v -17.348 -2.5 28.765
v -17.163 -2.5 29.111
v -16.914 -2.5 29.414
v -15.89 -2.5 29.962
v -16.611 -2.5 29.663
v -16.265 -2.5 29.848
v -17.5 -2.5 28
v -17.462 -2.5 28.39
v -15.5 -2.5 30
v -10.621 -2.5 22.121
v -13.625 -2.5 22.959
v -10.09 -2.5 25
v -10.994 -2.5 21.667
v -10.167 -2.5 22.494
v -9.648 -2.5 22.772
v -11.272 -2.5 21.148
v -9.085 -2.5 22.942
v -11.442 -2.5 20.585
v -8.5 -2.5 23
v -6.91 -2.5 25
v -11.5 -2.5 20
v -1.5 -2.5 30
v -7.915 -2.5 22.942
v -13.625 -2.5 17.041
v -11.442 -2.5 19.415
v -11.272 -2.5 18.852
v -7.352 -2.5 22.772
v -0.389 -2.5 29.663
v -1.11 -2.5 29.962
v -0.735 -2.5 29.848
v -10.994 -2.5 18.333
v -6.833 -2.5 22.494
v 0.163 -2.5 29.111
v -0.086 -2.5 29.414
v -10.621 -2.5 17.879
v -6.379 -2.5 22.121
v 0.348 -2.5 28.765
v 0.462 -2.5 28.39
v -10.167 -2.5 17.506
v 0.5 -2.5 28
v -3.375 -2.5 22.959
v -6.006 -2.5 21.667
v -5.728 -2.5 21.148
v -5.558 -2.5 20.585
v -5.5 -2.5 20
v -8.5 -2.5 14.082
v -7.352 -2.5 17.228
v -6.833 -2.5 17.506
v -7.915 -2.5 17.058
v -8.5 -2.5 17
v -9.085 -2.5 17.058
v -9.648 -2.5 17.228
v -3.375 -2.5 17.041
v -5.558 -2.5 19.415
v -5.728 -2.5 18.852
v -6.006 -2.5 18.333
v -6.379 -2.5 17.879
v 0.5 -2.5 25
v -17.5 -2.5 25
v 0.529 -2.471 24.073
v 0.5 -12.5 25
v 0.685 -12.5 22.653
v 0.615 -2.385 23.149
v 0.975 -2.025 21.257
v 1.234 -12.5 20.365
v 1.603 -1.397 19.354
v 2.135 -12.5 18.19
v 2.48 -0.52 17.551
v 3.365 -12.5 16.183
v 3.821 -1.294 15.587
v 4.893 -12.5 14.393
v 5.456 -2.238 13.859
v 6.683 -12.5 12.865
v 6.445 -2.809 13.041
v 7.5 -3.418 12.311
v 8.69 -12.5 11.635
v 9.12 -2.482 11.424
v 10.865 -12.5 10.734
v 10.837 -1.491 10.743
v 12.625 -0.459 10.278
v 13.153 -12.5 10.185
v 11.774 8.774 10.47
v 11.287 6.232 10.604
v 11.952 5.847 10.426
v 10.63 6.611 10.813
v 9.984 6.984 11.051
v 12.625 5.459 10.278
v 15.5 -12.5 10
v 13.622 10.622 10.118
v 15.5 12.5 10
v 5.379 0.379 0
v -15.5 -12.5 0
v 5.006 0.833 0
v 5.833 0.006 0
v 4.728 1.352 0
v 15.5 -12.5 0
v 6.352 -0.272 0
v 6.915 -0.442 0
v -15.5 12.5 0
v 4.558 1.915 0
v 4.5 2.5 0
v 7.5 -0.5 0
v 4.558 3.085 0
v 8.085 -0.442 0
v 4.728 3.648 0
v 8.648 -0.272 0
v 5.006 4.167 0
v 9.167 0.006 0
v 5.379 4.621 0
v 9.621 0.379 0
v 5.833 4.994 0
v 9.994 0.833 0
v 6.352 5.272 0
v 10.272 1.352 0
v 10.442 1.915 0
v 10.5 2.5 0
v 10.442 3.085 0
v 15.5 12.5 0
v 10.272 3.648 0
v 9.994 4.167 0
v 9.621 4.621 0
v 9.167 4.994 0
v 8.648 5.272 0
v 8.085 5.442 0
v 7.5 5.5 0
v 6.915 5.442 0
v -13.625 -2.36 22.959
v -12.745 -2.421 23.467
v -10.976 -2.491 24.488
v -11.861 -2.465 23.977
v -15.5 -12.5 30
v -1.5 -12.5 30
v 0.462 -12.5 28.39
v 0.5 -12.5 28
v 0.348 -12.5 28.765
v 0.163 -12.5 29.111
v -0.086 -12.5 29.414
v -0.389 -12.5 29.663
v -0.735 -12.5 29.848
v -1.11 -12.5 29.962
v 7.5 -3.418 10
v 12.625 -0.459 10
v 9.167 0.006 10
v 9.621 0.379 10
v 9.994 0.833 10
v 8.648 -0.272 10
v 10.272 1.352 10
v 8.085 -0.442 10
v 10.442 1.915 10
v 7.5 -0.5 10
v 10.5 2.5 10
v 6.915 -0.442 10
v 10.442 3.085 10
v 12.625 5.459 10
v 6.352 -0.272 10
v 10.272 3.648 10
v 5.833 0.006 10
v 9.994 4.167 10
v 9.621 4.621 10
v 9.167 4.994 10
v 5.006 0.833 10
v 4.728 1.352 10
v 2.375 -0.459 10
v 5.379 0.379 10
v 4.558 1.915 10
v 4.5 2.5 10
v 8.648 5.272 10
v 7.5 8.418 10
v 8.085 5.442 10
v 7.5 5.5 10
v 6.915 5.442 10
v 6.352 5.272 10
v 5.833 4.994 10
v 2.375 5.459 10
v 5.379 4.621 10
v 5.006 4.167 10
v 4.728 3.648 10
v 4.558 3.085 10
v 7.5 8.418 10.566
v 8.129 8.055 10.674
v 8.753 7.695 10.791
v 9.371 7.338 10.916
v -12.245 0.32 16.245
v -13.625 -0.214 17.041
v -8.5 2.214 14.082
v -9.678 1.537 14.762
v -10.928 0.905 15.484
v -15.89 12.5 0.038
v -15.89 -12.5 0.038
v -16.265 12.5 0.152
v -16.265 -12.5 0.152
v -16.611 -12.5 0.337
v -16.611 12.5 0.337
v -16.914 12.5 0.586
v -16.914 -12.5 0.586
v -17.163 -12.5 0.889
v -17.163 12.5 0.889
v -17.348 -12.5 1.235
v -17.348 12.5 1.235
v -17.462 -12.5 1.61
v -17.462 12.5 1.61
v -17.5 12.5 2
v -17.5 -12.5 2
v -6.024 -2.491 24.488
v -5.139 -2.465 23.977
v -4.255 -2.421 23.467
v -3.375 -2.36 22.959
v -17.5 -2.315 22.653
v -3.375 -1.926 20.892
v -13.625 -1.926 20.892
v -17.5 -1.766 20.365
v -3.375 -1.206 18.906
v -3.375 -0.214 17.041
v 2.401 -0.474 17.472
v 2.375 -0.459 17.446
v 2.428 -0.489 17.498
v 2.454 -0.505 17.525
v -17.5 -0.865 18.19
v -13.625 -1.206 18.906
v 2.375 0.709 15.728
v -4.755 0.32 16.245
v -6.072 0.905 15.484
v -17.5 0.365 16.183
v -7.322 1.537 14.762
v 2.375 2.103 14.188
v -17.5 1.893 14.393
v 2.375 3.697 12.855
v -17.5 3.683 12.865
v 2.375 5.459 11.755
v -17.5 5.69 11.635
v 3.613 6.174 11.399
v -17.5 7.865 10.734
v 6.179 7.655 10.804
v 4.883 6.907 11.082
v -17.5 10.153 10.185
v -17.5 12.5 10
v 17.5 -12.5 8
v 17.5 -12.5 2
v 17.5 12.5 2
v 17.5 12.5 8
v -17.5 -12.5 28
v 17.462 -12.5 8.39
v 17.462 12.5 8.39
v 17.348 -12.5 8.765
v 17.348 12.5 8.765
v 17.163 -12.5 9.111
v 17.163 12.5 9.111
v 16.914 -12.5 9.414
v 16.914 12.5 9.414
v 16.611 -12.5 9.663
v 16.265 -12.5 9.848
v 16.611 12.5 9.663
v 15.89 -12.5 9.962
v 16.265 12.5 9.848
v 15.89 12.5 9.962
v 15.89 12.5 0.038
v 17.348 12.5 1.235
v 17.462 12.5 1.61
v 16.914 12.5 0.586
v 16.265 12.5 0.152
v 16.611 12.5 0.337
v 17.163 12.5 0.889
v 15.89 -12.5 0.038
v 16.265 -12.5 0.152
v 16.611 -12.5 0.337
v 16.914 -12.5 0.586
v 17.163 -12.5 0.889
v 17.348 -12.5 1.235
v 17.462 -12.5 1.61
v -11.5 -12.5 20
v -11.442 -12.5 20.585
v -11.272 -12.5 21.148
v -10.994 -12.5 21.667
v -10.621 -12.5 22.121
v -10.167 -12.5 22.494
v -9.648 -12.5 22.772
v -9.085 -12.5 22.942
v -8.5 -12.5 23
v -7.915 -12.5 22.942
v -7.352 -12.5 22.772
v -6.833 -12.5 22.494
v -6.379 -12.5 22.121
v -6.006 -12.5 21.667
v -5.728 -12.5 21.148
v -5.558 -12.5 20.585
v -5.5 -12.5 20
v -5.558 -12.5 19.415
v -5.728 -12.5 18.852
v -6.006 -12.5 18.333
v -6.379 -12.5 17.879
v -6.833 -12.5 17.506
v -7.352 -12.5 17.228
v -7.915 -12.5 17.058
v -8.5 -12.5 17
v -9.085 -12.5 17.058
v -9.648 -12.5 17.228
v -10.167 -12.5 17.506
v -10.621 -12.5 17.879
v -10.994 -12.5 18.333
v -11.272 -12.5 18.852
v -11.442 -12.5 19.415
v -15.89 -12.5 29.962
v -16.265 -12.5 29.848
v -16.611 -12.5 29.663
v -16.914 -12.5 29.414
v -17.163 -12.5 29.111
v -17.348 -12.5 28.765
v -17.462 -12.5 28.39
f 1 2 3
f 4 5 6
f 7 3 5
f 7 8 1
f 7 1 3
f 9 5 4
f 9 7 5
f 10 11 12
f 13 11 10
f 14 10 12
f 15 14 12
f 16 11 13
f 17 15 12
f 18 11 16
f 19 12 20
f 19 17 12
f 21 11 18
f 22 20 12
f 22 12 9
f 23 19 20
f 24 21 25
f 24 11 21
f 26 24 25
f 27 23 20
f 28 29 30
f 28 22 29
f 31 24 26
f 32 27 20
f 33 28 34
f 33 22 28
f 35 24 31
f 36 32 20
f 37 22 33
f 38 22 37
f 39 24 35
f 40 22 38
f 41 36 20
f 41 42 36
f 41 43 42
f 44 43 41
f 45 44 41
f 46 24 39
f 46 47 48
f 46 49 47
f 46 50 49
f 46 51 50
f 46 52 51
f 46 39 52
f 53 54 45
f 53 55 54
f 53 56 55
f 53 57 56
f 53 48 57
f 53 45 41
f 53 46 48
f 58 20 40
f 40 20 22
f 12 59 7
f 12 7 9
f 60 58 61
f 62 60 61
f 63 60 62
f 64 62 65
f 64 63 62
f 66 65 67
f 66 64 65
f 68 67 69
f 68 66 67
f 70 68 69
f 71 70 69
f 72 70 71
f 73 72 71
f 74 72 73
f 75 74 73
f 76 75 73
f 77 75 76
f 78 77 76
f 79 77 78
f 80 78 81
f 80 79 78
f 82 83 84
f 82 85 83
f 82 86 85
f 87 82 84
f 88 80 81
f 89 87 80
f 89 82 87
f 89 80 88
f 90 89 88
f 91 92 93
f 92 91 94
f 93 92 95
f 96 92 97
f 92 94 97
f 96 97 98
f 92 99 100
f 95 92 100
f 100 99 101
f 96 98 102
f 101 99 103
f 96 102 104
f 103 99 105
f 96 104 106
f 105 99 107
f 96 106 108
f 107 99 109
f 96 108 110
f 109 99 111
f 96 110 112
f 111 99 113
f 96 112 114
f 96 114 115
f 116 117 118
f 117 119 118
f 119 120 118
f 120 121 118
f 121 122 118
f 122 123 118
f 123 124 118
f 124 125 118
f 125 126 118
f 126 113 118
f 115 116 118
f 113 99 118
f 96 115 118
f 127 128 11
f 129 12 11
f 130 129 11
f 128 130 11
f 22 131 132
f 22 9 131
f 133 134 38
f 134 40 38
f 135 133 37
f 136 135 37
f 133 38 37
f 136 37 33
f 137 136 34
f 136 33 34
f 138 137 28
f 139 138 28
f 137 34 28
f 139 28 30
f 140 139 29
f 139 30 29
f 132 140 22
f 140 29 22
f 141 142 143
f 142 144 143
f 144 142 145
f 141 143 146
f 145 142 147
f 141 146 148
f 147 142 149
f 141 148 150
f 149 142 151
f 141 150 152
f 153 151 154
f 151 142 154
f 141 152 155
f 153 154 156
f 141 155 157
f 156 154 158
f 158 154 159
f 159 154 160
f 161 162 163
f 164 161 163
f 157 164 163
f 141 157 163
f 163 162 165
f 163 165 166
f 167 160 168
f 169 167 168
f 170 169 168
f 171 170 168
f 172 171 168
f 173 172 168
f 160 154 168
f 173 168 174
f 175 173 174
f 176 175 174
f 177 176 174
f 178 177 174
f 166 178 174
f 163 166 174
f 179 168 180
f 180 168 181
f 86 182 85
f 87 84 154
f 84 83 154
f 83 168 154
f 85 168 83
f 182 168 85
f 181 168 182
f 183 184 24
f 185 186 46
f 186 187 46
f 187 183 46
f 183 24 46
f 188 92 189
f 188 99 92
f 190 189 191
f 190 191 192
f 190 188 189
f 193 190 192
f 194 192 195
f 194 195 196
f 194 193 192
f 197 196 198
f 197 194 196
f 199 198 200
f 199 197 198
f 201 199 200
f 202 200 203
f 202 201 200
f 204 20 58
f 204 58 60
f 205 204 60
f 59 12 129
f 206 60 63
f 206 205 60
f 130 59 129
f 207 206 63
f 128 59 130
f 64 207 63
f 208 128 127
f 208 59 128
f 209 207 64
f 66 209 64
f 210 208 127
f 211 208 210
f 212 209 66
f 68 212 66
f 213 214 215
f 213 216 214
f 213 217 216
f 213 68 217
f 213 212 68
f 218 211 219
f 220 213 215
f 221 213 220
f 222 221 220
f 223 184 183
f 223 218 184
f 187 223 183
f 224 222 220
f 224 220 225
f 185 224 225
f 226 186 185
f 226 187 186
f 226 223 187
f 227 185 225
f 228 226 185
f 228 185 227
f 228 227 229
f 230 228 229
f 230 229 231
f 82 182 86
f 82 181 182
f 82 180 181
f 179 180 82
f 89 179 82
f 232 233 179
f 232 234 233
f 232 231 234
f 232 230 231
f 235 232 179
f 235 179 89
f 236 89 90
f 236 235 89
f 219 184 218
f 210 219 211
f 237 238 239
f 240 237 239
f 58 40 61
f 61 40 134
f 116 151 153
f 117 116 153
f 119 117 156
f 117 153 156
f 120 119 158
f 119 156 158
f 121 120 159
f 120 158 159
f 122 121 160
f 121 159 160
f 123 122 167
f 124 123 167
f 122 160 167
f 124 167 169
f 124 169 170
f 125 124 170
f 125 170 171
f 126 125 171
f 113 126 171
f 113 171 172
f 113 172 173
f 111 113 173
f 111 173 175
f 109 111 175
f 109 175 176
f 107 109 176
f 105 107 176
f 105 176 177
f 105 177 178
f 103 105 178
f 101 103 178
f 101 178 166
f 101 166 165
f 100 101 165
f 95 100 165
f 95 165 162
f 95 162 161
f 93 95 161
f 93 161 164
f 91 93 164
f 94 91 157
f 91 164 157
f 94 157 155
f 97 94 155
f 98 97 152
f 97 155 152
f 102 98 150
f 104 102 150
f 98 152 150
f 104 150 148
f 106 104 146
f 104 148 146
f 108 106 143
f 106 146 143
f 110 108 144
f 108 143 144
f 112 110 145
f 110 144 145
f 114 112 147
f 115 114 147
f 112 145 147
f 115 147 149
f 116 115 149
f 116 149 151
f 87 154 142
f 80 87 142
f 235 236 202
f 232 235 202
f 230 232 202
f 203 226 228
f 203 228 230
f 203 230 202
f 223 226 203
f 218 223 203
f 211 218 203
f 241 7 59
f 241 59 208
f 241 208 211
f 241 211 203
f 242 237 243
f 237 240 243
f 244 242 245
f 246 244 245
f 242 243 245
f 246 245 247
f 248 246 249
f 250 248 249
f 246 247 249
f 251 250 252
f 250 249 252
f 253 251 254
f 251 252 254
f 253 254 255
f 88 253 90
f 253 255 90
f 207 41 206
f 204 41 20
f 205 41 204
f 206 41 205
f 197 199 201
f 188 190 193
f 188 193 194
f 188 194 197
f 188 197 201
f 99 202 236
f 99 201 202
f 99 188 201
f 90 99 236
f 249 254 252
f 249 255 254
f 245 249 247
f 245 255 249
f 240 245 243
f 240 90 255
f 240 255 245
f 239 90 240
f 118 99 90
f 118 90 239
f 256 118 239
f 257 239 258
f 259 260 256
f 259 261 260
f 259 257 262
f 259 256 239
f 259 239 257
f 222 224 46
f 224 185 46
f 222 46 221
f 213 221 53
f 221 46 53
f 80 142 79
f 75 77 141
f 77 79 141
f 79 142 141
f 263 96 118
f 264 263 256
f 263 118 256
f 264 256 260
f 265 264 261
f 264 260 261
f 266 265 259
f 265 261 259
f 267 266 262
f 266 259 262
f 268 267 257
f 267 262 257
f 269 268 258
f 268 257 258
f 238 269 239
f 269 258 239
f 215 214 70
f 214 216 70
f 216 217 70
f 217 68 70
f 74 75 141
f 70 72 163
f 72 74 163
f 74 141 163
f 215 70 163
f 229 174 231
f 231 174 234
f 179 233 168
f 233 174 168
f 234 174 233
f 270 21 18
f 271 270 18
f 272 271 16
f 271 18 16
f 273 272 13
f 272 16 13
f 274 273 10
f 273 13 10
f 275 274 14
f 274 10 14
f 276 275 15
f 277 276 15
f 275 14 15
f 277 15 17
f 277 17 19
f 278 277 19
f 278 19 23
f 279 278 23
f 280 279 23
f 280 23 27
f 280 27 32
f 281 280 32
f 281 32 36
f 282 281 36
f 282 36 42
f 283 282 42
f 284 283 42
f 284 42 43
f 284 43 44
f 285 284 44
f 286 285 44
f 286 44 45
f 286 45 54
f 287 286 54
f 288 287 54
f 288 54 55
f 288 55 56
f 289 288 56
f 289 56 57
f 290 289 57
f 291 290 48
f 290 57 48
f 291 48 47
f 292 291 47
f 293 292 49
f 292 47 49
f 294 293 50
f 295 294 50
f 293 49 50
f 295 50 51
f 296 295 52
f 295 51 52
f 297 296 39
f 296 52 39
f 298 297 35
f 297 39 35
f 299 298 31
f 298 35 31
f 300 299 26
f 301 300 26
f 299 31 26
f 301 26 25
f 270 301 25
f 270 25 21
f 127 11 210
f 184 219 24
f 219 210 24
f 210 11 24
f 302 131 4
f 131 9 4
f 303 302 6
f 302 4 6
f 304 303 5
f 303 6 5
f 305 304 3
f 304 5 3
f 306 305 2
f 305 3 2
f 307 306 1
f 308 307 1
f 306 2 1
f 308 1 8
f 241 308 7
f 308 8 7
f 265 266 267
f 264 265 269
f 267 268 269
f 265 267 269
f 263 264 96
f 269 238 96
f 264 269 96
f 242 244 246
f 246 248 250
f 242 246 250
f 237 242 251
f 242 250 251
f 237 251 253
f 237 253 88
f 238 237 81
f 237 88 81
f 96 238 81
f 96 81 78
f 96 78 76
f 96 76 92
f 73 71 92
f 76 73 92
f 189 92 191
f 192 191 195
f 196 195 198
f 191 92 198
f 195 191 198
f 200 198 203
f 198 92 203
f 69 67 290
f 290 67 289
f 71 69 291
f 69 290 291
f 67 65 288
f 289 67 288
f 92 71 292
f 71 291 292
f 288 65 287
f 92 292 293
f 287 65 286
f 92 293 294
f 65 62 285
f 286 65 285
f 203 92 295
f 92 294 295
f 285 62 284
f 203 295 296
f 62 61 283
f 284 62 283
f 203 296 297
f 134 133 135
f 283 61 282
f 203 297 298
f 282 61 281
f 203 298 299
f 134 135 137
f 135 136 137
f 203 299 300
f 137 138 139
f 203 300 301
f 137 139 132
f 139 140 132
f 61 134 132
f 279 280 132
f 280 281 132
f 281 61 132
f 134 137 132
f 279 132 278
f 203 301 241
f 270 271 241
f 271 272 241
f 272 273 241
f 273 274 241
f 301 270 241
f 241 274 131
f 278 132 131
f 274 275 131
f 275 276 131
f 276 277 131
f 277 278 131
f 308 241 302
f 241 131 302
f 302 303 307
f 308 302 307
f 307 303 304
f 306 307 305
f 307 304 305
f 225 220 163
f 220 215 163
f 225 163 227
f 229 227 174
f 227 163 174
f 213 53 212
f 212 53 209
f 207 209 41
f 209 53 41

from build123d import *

# Parameters (mm, degrees)
SKETCH1_W           = 35
SKETCH1_H           = 25
BOSS_EXTRUDE1_DEPTH = 10
SKETCH2_R           = 3
CUT_EXTRUDE1_DEPTH  = 24.717082451
SKETCH3_W           = 18
SKETCH3_H           = 10
BOSS_EXTRUDE2_DEPTH = 20
SKETCH4_R           = 3
CUT_EXTRUDE2_DEPTH  = 38.831864876
FILLET2_R           = 15
FILLET3_R           = 2
CUT_EXTRUDE3_START  = -10
CUT_EXTRUDE3_DEPTH  = 27.912057753
CUT_EXTRUDE4_START  = -10
CUT_EXTRUDE4_DEPTH  = 33.793107057


# Some blends are built 0.0001 mm under size
with BuildPart() as part:
    # Sketch1 → Boss-Extrude1 (new body)
    with BuildSketch(Plane.XY):
        Rectangle(SKETCH1_W, SKETCH1_H)
    extrude(amount=BOSS_EXTRUDE1_DEPTH)

    # Sketch2 → Cut-Extrude1 (cut, through all)
    with BuildSketch(Plane.XY.offset(10)):
        with Locations((7.5, 2.5)):
            Circle(SKETCH2_R)
    extrude(amount=-CUT_EXTRUDE1_DEPTH, mode=Mode.SUBTRACT)

    # Sketch3 → Boss-Extrude2 (add)
    with BuildSketch(Plane.XY.offset(10)):
        with Locations((-8.5, -7.5)):
            Rectangle(SKETCH3_W, SKETCH3_H)
    extrude(amount=BOSS_EXTRUDE2_DEPTH)

    # Sketch4 → Cut-Extrude2 (cut, through all)
    with BuildSketch(Plane(origin=(0, -2.5, 0), x_dir=(1, 0, 0), z_dir=(0, 1, 0))):
        with Locations(Location((-8.5, -20, 0), (0, 0, 180))):
            Circle(SKETCH4_R)
    extrude(amount=-CUT_EXTRUDE2_DEPTH, mode=Mode.SUBTRACT)

    # Fillet2
    # the kernel refuses this fillet: 15 mm, written as the material it adds along each edge
    with BuildSketch(Plane(origin=(-17.5, -2.5, 10), x_dir=(0, 1, 0), z_dir=(1, 0, 0))) as fillet2_piece_1_section:
        with BuildLine():
            CenterArc((FILLET2_R, FILLET2_R), FILLET2_R, 180, 90)
            Line((0, FILLET2_R), (0, 0))
            Line((0, 0), (FILLET2_R, 0))
        make_face()
    fillet2_piece_1 = extrude(amount=18, mode=Mode.PRIVATE)
    fillet2_piece_1 = fillet2_piece_1 - Plane(origin=(-8.5, 1.000391612, 20), x_dir=(-1, 0, 0), z_dir=(0, 1, 0)) * Cylinder(3, 96, mode=Mode.PRIVATE)
    add(fillet2_piece_1)
    with BuildSketch(Plane(origin=(0.5, -2.5, 10), x_dir=(1, 0, 0), z_dir=(0, -1, 0))) as fillet2_piece_2:
        with BuildLine():
            CenterArc((FILLET2_R, FILLET2_R), FILLET2_R, 180, 90)
            Line((0, FILLET2_R), (0, 0))
            Line((0, 0), (FILLET2_R, 0))
        make_face()
    extrude(amount=10)
    with BuildSketch(Plane(origin=(-17.5, -2.5, 10), x_dir=(0, 1, 0), z_dir=(1, 0, 0))) as fillet2_piece_3a_section:
        with BuildLine():
            CenterArc((FILLET2_R, FILLET2_R), FILLET2_R, 180, 90)
            Line((0, FILLET2_R), (0, 0))
            Line((0, 0), (FILLET2_R, 0))
        make_face()
    fillet2_piece_3a = extrude(amount=55.5, mode=Mode.PRIVATE)
    fillet2_piece_3a = split(fillet2_piece_3a, bisect_by=Plane(origin=(17.5, 8.593163467, 10.419487564), z_dir=(-1, 0, 0)), keep=Keep.TOP, mode=Mode.PRIVATE)
    fillet2_piece_3a = fillet2_piece_3a - Plane(origin=(7.5, 2.5, 10.419487564), x_dir=(1, 0, 0), z_dir=(0, 0, 1)) * Cylinder(3, 171, mode=Mode.PRIVATE)
    fillet2_piece_3a = split(fillet2_piece_3a, bisect_by=Plane(origin=(0.5, 8.593163467, 10.419487564), z_dir=(1, 0, 0)), keep=Keep.TOP, mode=Mode.PRIVATE)
    with BuildSketch(Plane(origin=(0.5, 35, 10), x_dir=(1, 0, 0), z_dir=(0, -1, 0))) as fillet2_piece_3b_section:
        with BuildLine():
            CenterArc((FILLET2_R, FILLET2_R), FILLET2_R, 180, 90)
            Line((0, FILLET2_R), (0, 0))
            Line((0, 0), (FILLET2_R, 0))
        make_face()
    fillet2_piece_3b = extrude(amount=47.5, mode=Mode.PRIVATE)
    fillet2_piece_3b = split(fillet2_piece_3b, bisect_by=Plane(origin=(3.591954859, 12.5, 13.608813205), z_dir=(0, -1, 0)), keep=Keep.TOP, mode=Mode.PRIVATE)
    fillet2_piece_3b = fillet2_piece_3b - Plane(origin=(7.5, 2.5, 13.608813205), x_dir=(1, 0, 0), z_dir=(0, 0, 1)) * Cylinder(3, 155, mode=Mode.PRIVATE)
    fillet2_piece_3b = split(fillet2_piece_3b, bisect_by=Plane(origin=(3.591954859, -2.5, 13.608813205), z_dir=(0, 1, 0)), keep=Keep.TOP, mode=Mode.PRIVATE)
    fillet2_piece_3 = fillet2_piece_3a & fillet2_piece_3b
    add(fillet2_piece_3)

    # Fillet3
    fillet3_edges = [part.edges().sort_by_distance(p)[0] for p in [
        (17.5, 0, 0),
        (-17.5, 0, 0),
        (-17.5, -7.5, 30),
        (0.5, -7.5, 30),
        (17.5, 0, 10),
    ]]
    fillet(fillet3_edges, radius=FILLET3_R - 0.0001)  # a hair under: the kernel refuses the full size

    # Sketch5 → Cut-Extrude3 (cut, through all)
    with BuildSketch(Plane(origin=(0, 0, 0), x_dir=(-1, 0, 0), z_dir=(0, 0, -1)).offset(CUT_EXTRUDE3_START)):
        Polygon((-7.5, -3.417840259), (-2.375, -0.45892013), (-2.375, 5.45892013), (-7.5, 8.417840259), (-12.625, 5.45892013), (-12.625, -0.45892013), align=None)
    extrude(amount=-CUT_EXTRUDE3_DEPTH, mode=Mode.SUBTRACT)

    # Sketch6 → Cut-Extrude4 (cut, through all)
    with BuildSketch(Plane.XZ.offset(12.5).offset(CUT_EXTRUDE4_START)):
        Polygon((-8.5, 14.082159741), (-3.375, 17.04107987), (-3.375, 22.95892013), (-8.5, 25.917840259), (-13.625, 22.95892013), (-13.625, 17.04107987), align=None)
    extrude(amount=-CUT_EXTRUDE4_DEPTH, mode=Mode.SUBTRACT)


solid = part.part
